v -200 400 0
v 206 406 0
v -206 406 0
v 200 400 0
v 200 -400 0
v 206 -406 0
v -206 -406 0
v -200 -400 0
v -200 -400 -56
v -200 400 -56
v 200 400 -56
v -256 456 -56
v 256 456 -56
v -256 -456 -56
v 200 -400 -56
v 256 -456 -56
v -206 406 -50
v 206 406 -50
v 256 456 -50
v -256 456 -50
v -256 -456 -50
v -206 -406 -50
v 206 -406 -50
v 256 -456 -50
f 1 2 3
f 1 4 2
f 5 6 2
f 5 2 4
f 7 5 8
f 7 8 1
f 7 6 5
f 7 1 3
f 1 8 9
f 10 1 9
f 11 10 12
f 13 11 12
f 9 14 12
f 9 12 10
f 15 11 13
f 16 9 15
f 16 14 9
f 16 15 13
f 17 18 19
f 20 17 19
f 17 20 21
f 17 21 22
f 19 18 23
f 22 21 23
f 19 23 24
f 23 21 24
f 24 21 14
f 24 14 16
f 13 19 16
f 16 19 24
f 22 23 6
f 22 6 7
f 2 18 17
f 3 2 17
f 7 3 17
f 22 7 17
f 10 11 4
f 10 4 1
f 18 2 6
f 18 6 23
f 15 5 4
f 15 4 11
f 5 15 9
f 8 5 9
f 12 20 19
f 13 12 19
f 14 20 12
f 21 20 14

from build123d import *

# Parameters (mm, degrees)
SKETCH046_W            = 400
SKETCH046_H            = 60
PAD003_DEPTH           = 400
SKETCH047_W            = 412
SKETCH047_H            = 50
PAD010_DEPTH           = 406
SKETCH048_W            = 512
SKETCH048_H            = 912
PAD011_DEPTH           = 6
CUT001_PLACEMENT_ANGLE = 180


with BuildPart() as body002:
    # Sketch046 → Pad003 (new body, symmetric)
    with BuildSketch(Plane.XZ):
        with Locations((0, 30)):
            Rectangle(SKETCH046_W, SKETCH046_H)
    extrude(amount=PAD003_DEPTH, both=True)


with BuildPart() as cut001:
    # Sketch047 → Pad010 (new body, symmetric)
    with BuildSketch(Plane.XZ):
        with Locations((0, 25)):
            Rectangle(SKETCH047_W, SKETCH047_H)
    extrude(amount=PAD010_DEPTH, both=True)

    # Sketch048 (on Face3 of Pad010) → Pad011 (join)
    with BuildSketch(Plane(origin=(0, 0, 50), x_dir=(-1, 0, 0), z_dir=(0, 0, 1))):
        Rectangle(SKETCH048_W, SKETCH048_H)
    extrude(amount=PAD011_DEPTH)

    # Cut001: cut Body002
    add(body002.part, mode=Mode.SUBTRACT)


with BuildPart() as cut001_1:
    # Cut001 placement: moved
    add(cut001.part.rotate(Axis((0, 0, 0), (0, 1, 0)), CUT001_PLACEMENT_ANGLE))


solid = cut001_1.part
